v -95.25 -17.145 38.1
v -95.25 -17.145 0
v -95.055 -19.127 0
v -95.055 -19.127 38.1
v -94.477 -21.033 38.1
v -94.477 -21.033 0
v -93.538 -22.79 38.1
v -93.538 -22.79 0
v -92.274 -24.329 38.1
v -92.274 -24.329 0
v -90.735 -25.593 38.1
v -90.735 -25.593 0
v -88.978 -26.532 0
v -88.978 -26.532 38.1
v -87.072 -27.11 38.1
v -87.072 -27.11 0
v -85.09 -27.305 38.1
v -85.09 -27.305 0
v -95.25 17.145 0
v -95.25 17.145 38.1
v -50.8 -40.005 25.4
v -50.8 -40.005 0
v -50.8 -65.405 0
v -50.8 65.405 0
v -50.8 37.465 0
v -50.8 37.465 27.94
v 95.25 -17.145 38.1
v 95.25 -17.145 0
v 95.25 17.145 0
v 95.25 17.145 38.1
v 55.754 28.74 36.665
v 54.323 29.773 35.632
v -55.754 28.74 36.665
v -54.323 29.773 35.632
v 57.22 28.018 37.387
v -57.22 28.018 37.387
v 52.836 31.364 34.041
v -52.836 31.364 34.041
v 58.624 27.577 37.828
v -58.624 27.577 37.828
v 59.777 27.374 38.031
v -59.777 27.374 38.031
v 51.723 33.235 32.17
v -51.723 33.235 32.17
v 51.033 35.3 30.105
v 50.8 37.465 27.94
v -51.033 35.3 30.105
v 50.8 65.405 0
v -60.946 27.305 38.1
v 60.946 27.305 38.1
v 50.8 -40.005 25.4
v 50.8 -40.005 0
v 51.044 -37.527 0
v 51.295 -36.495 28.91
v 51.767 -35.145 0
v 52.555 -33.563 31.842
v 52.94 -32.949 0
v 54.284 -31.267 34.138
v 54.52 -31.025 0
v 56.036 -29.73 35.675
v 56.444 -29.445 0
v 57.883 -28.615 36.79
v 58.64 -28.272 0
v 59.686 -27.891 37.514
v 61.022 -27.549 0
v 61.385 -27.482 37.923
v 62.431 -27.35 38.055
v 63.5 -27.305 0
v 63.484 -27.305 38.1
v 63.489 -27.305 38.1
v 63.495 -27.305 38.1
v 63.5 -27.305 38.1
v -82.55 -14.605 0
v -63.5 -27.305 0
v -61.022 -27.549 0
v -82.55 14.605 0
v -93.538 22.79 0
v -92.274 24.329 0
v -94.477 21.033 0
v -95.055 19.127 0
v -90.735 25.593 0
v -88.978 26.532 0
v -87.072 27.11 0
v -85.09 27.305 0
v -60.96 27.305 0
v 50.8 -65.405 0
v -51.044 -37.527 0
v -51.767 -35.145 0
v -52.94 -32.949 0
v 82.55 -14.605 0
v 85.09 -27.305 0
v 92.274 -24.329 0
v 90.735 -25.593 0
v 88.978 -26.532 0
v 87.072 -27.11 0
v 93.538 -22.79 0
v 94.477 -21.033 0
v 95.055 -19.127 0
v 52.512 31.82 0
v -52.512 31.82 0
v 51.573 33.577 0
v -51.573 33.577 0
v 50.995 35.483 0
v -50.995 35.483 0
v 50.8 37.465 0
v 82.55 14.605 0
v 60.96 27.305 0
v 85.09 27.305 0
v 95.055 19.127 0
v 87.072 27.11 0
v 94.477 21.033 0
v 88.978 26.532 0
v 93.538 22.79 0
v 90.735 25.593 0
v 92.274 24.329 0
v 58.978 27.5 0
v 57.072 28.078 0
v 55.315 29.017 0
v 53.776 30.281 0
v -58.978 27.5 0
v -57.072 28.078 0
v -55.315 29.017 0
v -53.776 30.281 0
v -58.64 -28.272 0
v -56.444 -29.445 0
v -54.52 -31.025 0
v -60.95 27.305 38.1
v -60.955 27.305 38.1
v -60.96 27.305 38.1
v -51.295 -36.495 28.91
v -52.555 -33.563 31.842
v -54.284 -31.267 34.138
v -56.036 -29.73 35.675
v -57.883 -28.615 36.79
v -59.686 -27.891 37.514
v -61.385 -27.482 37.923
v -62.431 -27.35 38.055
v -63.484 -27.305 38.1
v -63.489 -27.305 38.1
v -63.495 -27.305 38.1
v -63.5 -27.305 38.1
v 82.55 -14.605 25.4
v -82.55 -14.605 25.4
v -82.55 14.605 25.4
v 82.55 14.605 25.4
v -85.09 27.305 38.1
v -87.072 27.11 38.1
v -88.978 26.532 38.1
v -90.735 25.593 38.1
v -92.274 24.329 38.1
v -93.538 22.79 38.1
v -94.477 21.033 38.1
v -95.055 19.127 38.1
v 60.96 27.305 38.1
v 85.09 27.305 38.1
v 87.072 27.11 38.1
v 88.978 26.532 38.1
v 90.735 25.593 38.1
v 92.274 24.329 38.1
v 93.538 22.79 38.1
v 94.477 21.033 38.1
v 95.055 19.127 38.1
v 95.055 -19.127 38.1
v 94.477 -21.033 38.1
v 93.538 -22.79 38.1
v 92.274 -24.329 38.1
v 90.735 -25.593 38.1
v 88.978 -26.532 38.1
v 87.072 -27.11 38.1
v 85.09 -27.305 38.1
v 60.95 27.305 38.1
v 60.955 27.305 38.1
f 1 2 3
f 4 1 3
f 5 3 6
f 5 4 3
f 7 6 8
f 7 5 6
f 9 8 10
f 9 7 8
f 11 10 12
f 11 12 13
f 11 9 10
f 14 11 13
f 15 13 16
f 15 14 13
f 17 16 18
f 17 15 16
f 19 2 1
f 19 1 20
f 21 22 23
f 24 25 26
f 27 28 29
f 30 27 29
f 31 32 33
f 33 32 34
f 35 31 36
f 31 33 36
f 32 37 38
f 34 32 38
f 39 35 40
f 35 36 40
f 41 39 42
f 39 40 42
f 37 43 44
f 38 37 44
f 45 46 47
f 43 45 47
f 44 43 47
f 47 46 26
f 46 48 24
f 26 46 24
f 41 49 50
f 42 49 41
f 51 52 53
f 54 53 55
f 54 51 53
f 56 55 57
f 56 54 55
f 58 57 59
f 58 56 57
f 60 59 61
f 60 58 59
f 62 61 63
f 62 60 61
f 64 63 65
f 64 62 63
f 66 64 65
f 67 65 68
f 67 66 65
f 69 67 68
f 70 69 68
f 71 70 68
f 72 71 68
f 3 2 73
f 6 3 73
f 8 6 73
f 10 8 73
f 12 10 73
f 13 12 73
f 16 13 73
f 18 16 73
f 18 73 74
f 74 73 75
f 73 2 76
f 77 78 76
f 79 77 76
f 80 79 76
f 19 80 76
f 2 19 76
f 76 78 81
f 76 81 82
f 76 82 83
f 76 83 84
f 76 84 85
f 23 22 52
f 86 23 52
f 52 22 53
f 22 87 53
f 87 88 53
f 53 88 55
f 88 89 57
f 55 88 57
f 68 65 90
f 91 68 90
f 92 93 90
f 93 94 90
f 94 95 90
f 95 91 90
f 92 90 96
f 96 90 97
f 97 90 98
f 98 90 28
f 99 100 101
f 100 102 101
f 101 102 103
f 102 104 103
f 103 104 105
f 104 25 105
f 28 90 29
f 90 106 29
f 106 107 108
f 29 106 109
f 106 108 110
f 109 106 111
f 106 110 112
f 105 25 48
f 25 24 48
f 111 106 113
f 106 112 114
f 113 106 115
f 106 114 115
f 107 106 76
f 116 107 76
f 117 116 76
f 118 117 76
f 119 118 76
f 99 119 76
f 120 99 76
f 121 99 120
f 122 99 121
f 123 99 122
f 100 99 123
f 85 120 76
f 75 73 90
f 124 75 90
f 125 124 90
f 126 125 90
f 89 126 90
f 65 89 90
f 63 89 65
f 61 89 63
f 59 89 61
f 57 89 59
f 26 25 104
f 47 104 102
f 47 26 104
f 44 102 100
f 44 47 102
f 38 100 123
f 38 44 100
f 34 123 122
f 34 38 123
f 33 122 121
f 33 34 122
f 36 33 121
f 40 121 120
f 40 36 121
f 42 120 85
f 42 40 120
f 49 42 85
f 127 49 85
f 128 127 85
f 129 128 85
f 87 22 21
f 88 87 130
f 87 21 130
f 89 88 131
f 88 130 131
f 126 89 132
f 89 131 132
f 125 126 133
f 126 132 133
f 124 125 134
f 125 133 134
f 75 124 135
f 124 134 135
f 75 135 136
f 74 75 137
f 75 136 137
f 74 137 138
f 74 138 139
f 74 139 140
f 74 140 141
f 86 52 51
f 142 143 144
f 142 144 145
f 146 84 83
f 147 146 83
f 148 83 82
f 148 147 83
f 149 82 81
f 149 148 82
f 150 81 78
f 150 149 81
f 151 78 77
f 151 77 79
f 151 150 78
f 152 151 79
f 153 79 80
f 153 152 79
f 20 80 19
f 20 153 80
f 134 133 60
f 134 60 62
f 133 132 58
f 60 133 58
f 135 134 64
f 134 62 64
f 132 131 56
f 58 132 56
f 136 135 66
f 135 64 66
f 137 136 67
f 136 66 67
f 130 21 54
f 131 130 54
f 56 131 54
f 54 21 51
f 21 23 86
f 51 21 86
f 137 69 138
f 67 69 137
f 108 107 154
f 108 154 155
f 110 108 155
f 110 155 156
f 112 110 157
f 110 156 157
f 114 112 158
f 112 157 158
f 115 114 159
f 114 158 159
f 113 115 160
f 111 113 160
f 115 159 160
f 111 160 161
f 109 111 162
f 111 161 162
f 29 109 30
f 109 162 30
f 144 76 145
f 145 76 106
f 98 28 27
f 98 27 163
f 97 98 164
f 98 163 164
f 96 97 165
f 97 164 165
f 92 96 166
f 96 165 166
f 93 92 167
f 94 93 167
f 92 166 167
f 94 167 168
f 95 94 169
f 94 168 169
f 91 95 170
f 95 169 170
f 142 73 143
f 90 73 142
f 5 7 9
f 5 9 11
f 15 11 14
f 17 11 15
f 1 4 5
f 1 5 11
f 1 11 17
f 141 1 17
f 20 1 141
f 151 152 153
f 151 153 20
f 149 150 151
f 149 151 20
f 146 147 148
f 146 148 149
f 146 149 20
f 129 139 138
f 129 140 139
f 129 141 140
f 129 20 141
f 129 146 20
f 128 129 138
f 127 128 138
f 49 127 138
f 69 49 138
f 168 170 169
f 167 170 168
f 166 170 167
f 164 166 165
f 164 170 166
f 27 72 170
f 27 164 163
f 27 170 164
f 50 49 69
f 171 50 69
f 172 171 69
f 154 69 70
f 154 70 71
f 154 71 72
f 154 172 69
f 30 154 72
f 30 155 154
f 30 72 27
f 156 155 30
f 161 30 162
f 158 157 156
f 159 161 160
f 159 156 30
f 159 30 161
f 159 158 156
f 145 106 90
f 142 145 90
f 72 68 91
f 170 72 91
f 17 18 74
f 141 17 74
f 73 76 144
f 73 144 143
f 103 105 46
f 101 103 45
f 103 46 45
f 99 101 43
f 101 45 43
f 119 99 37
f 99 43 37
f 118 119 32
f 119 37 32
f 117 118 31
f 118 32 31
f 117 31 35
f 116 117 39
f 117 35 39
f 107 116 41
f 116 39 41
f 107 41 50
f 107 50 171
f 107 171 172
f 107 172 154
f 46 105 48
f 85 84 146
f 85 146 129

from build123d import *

# Parameters (mm, degrees)
F0_W      = 190.5
F0_H      = 54.61
F1_DEPTH  = 38.1
F2_W      = 165.1
F2_H      = 29.21
F3_DEPTH  = 25.4
F4_W      = 101.6
F4_H      = 38.1
F5_DEPTH  = 38.1
F6_SIZE   = 38.09999
F7_R      = 10.16
F8_R      = 10.16
F9_W      = 101.6
F9_H      = 38.1
F10_DEPTH = 38.1
F11_SIZE  = 38.09999
F12_R     = 12.7


# Not quite as in the source:
# - a fillet or chamfer is up to 0.001 mm smaller than in the source, because OpenCascade refuses the exact size


with BuildPart() as f1:
    # F0 (on Top) → F1 (new body)
    with BuildSketch(Plane.XY):
        Rectangle(F0_W, F0_H)
    extrude(amount=F1_DEPTH)

    # F2 (on face) → F3 (cut)
    with BuildSketch(Plane(origin=(0, 0, 0), x_dir=(1, 0, 0), z_dir=(0, 0, -1))):
        Rectangle(F2_W, F2_H)
    extrude(amount=-F3_DEPTH, mode=Mode.SUBTRACT)

    # F4 (on face) → F5 (join)
    with BuildSketch(Plane(origin=(0, 27.305, 0), x_dir=(-1, 0, 0), z_dir=(0, 1, 0))):
        with Locations((0, 19.05)):
            Rectangle(F4_W, F4_H)
    extrude(amount=F5_DEPTH)

    # F6 (size 38.1 in the source; OpenCascade refuses exactly that, so slightly less here)
    f6_edges = [f1.edges().sort_by_distance(p)[0] for p in [
        (0, 65.405, 38.1),
    ]]
    chamfer(f6_edges, length=F6_SIZE)

    # F7 (call 1 of 2: OpenCascade refuses the feature's edges together)
    f7_edges = [f1.edges().sort_by_distance(p)[0] for p in [
        (-50.8, 27.305, 19.05),
    ]]
    fillet(f7_edges, radius=F7_R)

    # F7#2 (call 2 of 2)
    f7_2_edges = [f1.edges().sort_by_distance(p)[0] for p in [
        (50.8, 27.305, 19.05),
    ]]
    fillet(f7_2_edges, radius=F7_R)

    # F8
    f8_edges = [f1.edges().sort_by_distance(p)[0] for p in [
        (-95.25, 27.305, 19.05),
        (-95.25, -27.305, 19.05),
        (95.25, 27.305, 19.05),
        (95.25, -27.305, 19.05),
    ]]
    fillet(f8_edges, radius=F8_R)

    # F9 (on face) → F10 (join)
    with BuildSketch(Plane.XZ.offset(27.305)):
        with Locations((0, 19.05)):
            Rectangle(F9_W, F9_H)
    extrude(amount=F10_DEPTH)

    # F11 (size 38.1 in the source; OpenCascade refuses exactly that, so slightly less here)
    f11_edges = [f1.edges().sort_by_distance(p)[0] for p in [
        (0, -65.405, 38.1),
    ]]
    chamfer(f11_edges, length=F11_SIZE)

    # F12 (call 1 of 2: OpenCascade refuses the feature's edges together)
    f12_edges = [f1.edges().sort_by_distance(p)[0] for p in [
        (50.8, -27.305, 19.05),
    ]]
    fillet(f12_edges, radius=F12_R)

    # F12#2 (call 2 of 2)
    f12_2_edges = [f1.edges().sort_by_distance(p)[0] for p in [
        (-50.8, -27.305, 19.05),
    ]]
    fillet(f12_2_edges, radius=F12_R)


solid = f1.part
